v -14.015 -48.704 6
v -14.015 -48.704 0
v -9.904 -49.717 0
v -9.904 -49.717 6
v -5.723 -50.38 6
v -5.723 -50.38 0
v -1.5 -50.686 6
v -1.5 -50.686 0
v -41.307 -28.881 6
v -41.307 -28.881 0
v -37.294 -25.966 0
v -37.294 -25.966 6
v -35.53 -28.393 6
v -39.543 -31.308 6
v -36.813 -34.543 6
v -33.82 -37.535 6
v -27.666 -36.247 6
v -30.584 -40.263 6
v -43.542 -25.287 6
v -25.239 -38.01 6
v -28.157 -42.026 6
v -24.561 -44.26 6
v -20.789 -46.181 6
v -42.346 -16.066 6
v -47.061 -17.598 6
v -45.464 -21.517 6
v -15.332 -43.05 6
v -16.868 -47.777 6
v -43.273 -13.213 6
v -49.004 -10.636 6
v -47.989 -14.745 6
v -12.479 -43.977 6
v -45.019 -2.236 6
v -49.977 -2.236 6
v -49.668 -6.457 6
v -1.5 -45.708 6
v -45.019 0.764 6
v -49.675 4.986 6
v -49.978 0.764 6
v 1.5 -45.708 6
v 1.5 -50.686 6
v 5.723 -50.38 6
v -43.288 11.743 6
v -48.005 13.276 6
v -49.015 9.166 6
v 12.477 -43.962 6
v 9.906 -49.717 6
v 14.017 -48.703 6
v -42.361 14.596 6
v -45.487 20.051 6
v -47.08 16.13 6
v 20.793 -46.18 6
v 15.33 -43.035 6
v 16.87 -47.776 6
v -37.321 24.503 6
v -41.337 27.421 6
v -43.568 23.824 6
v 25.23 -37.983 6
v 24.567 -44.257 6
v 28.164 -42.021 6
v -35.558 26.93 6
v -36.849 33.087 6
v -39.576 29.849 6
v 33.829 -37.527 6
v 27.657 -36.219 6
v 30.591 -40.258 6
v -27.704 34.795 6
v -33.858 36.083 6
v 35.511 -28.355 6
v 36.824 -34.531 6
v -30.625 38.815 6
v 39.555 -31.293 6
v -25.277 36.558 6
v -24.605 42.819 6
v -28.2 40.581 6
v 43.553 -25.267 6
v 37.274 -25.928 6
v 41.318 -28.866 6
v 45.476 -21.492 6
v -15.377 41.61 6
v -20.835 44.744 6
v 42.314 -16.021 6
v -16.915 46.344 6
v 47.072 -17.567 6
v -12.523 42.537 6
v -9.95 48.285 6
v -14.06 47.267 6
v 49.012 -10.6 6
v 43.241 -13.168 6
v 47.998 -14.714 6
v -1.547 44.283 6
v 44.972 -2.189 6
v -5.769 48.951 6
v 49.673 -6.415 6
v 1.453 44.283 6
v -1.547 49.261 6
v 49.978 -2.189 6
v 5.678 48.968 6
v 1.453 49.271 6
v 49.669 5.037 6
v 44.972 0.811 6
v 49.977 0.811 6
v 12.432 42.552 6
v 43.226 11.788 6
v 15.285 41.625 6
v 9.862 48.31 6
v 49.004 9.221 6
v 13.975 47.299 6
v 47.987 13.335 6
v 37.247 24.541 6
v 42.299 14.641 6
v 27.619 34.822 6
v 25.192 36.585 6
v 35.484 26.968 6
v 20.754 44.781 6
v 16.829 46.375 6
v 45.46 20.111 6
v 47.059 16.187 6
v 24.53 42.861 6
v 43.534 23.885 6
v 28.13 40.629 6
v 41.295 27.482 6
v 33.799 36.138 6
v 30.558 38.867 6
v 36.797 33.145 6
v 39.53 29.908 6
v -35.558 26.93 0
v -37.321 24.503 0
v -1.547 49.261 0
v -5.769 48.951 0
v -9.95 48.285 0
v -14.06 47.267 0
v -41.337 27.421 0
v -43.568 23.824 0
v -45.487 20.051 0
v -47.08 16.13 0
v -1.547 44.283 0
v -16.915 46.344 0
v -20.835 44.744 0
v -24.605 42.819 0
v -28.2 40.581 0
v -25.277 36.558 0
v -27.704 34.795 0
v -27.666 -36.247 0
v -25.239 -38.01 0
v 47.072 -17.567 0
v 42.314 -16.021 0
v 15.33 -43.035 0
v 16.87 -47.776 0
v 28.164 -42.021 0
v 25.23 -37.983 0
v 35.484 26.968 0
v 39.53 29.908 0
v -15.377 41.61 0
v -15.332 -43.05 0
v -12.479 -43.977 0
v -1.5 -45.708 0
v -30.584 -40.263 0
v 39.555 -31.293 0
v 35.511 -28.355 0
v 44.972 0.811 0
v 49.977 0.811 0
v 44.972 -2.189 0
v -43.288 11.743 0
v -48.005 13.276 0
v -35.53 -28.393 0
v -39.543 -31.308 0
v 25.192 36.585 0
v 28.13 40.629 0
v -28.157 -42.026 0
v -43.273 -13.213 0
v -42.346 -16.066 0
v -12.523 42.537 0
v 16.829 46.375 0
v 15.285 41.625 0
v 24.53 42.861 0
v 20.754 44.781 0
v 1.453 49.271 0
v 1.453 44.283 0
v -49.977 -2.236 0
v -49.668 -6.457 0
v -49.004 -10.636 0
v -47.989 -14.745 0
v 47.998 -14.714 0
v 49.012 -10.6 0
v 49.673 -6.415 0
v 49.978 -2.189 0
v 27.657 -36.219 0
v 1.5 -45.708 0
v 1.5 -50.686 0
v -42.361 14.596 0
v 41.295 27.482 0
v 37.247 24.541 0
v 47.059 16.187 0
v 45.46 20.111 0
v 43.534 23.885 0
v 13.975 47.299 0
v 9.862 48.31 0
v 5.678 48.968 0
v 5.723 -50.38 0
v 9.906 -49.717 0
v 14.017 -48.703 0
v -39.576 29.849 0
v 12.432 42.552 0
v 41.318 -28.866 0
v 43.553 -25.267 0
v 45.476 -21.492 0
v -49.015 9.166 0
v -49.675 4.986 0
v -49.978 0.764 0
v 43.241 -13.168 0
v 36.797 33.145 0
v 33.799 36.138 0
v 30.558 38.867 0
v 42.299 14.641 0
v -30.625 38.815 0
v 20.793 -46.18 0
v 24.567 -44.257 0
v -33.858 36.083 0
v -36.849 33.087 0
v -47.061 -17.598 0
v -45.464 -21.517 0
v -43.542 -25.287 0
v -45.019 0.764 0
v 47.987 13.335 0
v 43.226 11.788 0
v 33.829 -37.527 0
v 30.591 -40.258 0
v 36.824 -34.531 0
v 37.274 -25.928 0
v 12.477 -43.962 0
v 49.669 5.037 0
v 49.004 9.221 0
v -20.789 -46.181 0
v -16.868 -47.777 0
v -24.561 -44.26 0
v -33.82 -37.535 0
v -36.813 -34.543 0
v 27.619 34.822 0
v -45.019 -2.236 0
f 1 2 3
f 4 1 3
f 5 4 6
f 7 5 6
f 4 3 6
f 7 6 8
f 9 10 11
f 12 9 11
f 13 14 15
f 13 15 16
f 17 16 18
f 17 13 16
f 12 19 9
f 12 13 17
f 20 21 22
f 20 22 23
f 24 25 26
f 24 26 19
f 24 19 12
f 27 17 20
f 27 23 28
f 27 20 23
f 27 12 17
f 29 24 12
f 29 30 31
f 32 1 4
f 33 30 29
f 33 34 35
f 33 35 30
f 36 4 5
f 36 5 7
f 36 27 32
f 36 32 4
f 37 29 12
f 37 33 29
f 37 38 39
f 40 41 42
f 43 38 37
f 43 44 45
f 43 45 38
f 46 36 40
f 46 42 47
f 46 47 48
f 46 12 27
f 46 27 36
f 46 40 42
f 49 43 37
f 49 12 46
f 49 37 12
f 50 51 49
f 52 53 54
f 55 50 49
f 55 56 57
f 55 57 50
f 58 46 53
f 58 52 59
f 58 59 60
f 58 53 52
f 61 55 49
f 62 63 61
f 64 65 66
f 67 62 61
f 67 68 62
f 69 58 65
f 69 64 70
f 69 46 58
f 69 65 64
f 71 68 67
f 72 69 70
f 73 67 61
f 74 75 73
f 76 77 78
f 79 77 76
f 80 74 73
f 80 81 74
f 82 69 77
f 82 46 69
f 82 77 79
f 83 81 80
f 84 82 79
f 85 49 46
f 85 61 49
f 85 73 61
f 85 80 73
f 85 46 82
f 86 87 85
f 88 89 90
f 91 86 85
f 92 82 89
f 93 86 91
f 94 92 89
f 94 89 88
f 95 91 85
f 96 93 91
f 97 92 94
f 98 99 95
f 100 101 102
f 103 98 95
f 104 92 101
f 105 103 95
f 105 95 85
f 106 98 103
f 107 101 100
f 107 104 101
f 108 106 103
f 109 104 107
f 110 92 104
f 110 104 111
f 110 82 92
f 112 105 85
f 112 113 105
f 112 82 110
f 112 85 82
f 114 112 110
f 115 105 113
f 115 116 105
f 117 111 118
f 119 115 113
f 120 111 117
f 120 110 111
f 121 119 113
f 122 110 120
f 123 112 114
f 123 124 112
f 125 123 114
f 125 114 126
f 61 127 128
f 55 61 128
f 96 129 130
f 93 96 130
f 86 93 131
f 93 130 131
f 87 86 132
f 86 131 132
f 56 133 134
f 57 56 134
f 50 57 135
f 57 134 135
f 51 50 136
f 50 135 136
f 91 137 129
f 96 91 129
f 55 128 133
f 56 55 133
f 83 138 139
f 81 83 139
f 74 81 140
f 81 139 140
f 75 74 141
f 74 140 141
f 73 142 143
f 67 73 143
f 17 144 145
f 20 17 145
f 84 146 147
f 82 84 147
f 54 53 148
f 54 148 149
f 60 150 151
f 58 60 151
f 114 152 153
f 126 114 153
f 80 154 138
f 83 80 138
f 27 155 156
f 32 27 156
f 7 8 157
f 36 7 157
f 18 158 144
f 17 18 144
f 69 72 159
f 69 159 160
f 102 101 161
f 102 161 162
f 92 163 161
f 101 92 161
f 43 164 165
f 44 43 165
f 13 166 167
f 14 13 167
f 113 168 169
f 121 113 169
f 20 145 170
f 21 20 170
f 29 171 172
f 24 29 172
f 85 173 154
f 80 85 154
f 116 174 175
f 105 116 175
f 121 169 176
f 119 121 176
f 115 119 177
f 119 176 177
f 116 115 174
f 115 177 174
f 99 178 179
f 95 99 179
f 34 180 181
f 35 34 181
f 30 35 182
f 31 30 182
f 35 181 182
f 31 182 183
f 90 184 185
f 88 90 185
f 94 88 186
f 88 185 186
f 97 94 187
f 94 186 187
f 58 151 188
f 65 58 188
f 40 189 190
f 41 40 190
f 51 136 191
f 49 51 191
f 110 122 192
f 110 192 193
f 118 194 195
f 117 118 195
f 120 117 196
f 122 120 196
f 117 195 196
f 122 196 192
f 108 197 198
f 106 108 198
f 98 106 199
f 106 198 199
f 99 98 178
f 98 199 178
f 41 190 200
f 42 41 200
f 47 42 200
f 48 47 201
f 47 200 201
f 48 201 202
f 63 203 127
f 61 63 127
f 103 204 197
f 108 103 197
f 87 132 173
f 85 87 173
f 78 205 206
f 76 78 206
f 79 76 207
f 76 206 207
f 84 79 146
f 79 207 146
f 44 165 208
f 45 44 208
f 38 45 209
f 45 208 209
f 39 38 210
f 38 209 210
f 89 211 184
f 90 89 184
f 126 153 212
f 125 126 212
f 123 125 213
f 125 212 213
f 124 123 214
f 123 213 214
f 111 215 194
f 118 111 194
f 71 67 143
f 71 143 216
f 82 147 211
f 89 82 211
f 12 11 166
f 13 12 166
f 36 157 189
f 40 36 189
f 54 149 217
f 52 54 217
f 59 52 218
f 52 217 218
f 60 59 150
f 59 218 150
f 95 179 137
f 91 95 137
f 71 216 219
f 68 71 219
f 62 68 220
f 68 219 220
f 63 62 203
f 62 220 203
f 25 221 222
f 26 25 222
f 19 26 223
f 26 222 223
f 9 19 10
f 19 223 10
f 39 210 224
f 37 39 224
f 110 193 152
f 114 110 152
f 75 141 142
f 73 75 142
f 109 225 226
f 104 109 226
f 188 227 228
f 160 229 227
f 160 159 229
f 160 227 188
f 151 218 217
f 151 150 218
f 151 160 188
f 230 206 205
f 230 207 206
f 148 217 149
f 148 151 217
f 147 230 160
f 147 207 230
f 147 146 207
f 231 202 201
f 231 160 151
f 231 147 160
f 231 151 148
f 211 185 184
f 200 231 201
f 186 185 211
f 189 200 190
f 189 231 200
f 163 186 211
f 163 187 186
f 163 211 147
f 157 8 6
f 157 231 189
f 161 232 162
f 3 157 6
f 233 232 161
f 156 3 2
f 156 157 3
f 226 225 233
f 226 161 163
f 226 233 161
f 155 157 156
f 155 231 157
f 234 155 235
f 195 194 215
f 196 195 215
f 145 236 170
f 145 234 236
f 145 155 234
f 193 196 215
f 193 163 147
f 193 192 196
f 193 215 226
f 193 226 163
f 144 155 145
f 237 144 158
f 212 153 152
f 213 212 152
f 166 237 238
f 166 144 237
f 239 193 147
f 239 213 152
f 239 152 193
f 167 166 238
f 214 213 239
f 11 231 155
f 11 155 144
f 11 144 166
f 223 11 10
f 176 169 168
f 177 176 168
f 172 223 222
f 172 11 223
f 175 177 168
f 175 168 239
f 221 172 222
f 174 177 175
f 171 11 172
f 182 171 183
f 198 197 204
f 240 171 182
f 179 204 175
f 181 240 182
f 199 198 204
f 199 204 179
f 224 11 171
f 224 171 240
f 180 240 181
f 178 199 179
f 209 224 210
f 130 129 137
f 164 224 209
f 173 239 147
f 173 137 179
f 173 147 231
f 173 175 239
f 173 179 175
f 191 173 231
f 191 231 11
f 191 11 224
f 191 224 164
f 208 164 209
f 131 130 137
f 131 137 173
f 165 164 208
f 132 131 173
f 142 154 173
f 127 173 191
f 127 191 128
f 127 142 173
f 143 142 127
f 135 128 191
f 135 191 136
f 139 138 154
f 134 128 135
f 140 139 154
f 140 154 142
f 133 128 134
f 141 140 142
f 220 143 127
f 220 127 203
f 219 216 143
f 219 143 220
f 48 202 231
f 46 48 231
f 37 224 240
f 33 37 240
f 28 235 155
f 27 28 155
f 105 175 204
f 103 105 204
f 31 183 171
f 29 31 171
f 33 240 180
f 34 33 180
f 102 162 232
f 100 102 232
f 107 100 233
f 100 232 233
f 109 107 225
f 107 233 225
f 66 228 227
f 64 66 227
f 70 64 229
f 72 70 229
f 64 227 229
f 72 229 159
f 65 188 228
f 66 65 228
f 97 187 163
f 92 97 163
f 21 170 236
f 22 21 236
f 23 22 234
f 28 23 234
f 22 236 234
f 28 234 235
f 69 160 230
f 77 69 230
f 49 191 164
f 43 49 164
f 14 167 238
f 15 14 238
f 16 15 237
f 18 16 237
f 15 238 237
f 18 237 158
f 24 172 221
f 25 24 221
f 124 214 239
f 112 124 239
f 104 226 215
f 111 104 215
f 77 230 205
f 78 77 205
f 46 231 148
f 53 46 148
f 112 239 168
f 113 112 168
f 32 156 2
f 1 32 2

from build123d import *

# Parameters (mm, degrees)
SKETCH2_W           = 16
SKETCH2_H           = 6
SKETCH2_R           = 2.75
BOSS_EXTRUDE1_DEPTH = 6
SKETCH4_R           = 2.75
SKETCH4_W           = 16
SKETCH4_H           = 6
BOSS_EXTRUDE2_DEPTH = 6


with BuildPart() as part:
    # Sketch2 → Boss-Extrude1 (new body)
    with BuildSketch(Plane.XY):
        with BuildLine():
            ThreePointArc((-14.014958559, -48.70381072), (-7.820513245, -50.092784824), (-1.5, -50.685671098))
            Line((-1.5, -50.685671098), (-1.5, -45.708176163))
            Line((-1.5, -45.708176163), (1.5, -45.708176163))
            Line((1.5, -45.708176163), (1.5, -50.685671098))
            ThreePointArc((1.5, -50.685671098), (7.821643905, -50.09260576), (14.017156267, -48.703168924))
            Line((14.017156267, -48.703168924), (12.476730902, -43.962227135))
            Line((12.476730902, -43.962227135), (15.32990045, -43.035176152))
            Line((15.32990045, -43.035176152), (16.870328795, -47.776127109))
            ThreePointArc((16.870328795, -47.776127109), (22.700337229, -45.258088505), (28.164148211, -42.021379325))
            Line((28.164148211, -42.021379325), (25.229863981, -37.982683562))
            Line((25.229863981, -37.982683562), (27.656914964, -36.219327805))
            Line((27.656914964, -36.219327805), (30.591129228, -40.257927268))
            ThreePointArc((30.591129228, -40.257927268), (35.358240772, -36.060613271), (39.55477218, -31.292812793))
            Line((39.55477218, -31.292812793), (35.511033717, -28.354864828))
            Line((35.511033717, -28.354864828), (37.274389474, -25.927813845))
            Line((37.274389474, -25.927813845), (41.317825829, -28.865542317))
            ThreePointArc((41.317825829, -28.865542317), (44.554494815, -23.399517942), (47.071992795, -17.567224011))
            Line((47.071992795, -17.567224011), (42.313847582, -16.021208913))
            Line((42.313847582, -16.021208913), (43.240898565, -13.168039364))
            Line((43.240898565, -13.168039364), (47.998350807, -14.713829302))
            ThreePointArc((47.998350807, -14.713829302), (49.386863483, -8.514437454), (49.978066205, -2.189019992))
            Line((49.978066205, -2.189019992), (44.972398757, -2.189019992))
            Line((44.972398757, -2.189019992), (44.972398757, 0.810980008))
            Line((44.972398757, 0.810980008), (49.976916317, 0.810980008))
            ThreePointArc((49.976916317, 0.810980008), (49.380832331, 7.136146516), (47.987483994, 13.334664716))
            Line((47.987483994, 13.334664716), (43.22644973, 11.787710909))
            Line((43.22644973, 11.787710909), (42.299398746, 14.640880458))
            Line((42.299398746, 14.640880458), (47.058915168, 16.187341088))
            ThreePointArc((47.058915168, 16.187341088), (44.536626084, 22.0182168), (41.295318935, 27.482188044))
            Line((41.295318935, 27.482188044), (37.246906156, 24.540843989))
            Line((37.246906156, 24.540843989), (35.483550399, 26.967894972))
            Line((35.483550399, 26.967894972), (39.530326401, 29.908049839))
            ThreePointArc((39.530326401, 29.908049839), (35.329326435, 34.673156396), (30.558045552, 38.86714256))
            Line((30.558045552, 38.86714256), (27.619087422, 34.822013725))
            Line((27.619087422, 34.822013725), (25.192036439, 36.585369482))
            Line((25.192036439, 36.585369482), (28.129589934, 40.628565002))
            ThreePointArc((28.129589934, 40.628565002), (22.66202489, 43.861237429), (16.828745179, 46.374658668))
            Line((16.828745179, 46.374658668), (15.285431508, 41.62482759))
            Line((15.285431508, 41.62482759), (12.432261959, 42.551878573))
            Line((12.432261959, 42.551878573), (13.974753738, 47.299180128))
            ThreePointArc((13.974753738, 47.299180128), (7.776727495, 48.683346485), (1.453242586, 49.270700235))
            Line((1.453242586, 49.270700235), (1.453242586, 44.283378765))
            Line((1.453242586, 44.283378765), (-1.546757414, 44.283378765))
            Line((-1.546757414, 44.283378765), (-1.546757414, 49.2608737))
            ThreePointArc((-1.546757414, 49.2608737), (-7.866904098, 48.661958763), (-14.060191394, 47.266915506))
            Line((-14.060191394, 47.266915506), (-12.523488315, 42.537429737))
            Line((-12.523488315, 42.537429737), (-15.376657864, 41.610378754))
            Line((-15.376657864, 41.610378754), (-16.914659767, 46.343861891))
            ThreePointArc((-16.914659767, 46.343861891), (-22.740383136, 43.821308169), (-28.199510335, 40.580897657))
            Line((-28.199510335, 40.580897657), (-25.276621395, 36.557886164))
            Line((-25.276621395, 36.557886164), (-27.703672378, 34.794530407))
            Line((-27.703672378, 34.794530407), (-30.624981542, 38.815367524))
            ThreePointArc((-30.624981542, 38.815367524), (-35.385501758, 34.616974444), (-39.575762572, 29.849294558))
            Line((-39.575762572, 29.849294558), (-35.557791131, 26.93006743))
            Line((-35.557791131, 26.93006743), (-37.321146887, 24.503016447))
            Line((-37.321146887, 24.503016447), (-41.33714976, 27.420813327))
            ThreePointArc((-41.33714976, 27.420813327), (-44.567381262, 21.957845266), (-47.079571363, 16.129696634))
            Line((-47.079571363, 16.129696634), (-42.360604995, 14.596411515))
            Line((-42.360604995, 14.596411515), (-43.287655979, 11.743241967))
            Line((-43.287655979, 11.743241967), (-48.004645978, 13.275884924))
            ThreePointArc((-48.004645978, 13.275884924), (-49.389276358, 7.082804571), (-49.978315717, 0.764222594))
            Line((-49.978315717, 0.764222594), (-45.01915617, 0.764222594))
            Line((-45.01915617, 0.764222594), (-45.01915617, -2.235777406))
            Line((-45.01915617, -2.235777406), (-49.976658896, -2.235777406))
            ThreePointArc((-49.976658896, -2.235777406), (-49.380673152, -8.553500826), (-47.989286669, -14.744855434))
            Line((-47.989286669, -14.744855434), (-43.273207143, -13.212508307))
            Line((-43.273207143, -13.212508307), (-42.34615616, -16.065677856))
            Line((-42.34615616, -16.065677856), (-47.06108419, -17.597650839))
            ThreePointArc((-47.06108419, -17.597650839), (-44.542778803, -23.422507686), (-41.306963736, -28.881474636))
            Line((-41.306963736, -28.881474636), (-37.293663569, -25.965641387))
            Line((-37.293663569, -25.965641387), (-35.530307812, -28.39269237))
            Line((-35.530307812, -28.39269237), (-39.542974081, -31.308065065))
            ThreePointArc((-39.542974081, -31.308065065), (-35.348264075, -36.07058879), (-30.584062086, -40.263392586))
            Line((-30.584062086, -40.263392586), (-27.665844836, -36.246811123))
            Line((-27.665844836, -36.246811123), (-25.238793853, -38.01016688))
            Line((-25.238793853, -38.01016688), (-28.156765996, -42.026410983))
            ThreePointArc((-28.156765996, -42.026410983), (-22.695337069, -45.260635975), (-16.868173537, -47.776899552))
            Line((-16.868173537, -47.776899552), (-15.332188921, -43.049624988))
            Line((-15.332188921, -43.049624988), (-12.479019372, -43.976675971))
            Line((-12.479019372, -43.976675971), (-14.014958559, -48.70381072))
        make_face()
        with Locations((0, -31.708176163)):
            Rectangle(SKETCH2_W, SKETCH2_H, mode=Mode.SUBTRACT)
        with Locations((-17.5, -8.708176163)):
            Circle(SKETCH2_R, mode=Mode.SUBTRACT)
        with Locations((17.5, -8.708176163)):
            Circle(SKETCH2_R, mode=Mode.SUBTRACT)
    extrude(amount=BOSS_EXTRUDE1_DEPTH)

    # Sketch4 → Boss-Extrude2 (add)
    with BuildSketch(Plane(origin=(0, 0, 0), x_dir=(-1, 0, 0), z_dir=(0, 0, -1))):
        with Locations((17.5, -8.708176163)):
            Circle(SKETCH4_R)
        with Locations((-17.5, -8.708176163)):
            Circle(SKETCH4_R)
        with Locations((0, -31.708176163)):
            Rectangle(SKETCH4_W, SKETCH4_H)
    extrude(amount=-BOSS_EXTRUDE2_DEPTH)


solid = part.part
